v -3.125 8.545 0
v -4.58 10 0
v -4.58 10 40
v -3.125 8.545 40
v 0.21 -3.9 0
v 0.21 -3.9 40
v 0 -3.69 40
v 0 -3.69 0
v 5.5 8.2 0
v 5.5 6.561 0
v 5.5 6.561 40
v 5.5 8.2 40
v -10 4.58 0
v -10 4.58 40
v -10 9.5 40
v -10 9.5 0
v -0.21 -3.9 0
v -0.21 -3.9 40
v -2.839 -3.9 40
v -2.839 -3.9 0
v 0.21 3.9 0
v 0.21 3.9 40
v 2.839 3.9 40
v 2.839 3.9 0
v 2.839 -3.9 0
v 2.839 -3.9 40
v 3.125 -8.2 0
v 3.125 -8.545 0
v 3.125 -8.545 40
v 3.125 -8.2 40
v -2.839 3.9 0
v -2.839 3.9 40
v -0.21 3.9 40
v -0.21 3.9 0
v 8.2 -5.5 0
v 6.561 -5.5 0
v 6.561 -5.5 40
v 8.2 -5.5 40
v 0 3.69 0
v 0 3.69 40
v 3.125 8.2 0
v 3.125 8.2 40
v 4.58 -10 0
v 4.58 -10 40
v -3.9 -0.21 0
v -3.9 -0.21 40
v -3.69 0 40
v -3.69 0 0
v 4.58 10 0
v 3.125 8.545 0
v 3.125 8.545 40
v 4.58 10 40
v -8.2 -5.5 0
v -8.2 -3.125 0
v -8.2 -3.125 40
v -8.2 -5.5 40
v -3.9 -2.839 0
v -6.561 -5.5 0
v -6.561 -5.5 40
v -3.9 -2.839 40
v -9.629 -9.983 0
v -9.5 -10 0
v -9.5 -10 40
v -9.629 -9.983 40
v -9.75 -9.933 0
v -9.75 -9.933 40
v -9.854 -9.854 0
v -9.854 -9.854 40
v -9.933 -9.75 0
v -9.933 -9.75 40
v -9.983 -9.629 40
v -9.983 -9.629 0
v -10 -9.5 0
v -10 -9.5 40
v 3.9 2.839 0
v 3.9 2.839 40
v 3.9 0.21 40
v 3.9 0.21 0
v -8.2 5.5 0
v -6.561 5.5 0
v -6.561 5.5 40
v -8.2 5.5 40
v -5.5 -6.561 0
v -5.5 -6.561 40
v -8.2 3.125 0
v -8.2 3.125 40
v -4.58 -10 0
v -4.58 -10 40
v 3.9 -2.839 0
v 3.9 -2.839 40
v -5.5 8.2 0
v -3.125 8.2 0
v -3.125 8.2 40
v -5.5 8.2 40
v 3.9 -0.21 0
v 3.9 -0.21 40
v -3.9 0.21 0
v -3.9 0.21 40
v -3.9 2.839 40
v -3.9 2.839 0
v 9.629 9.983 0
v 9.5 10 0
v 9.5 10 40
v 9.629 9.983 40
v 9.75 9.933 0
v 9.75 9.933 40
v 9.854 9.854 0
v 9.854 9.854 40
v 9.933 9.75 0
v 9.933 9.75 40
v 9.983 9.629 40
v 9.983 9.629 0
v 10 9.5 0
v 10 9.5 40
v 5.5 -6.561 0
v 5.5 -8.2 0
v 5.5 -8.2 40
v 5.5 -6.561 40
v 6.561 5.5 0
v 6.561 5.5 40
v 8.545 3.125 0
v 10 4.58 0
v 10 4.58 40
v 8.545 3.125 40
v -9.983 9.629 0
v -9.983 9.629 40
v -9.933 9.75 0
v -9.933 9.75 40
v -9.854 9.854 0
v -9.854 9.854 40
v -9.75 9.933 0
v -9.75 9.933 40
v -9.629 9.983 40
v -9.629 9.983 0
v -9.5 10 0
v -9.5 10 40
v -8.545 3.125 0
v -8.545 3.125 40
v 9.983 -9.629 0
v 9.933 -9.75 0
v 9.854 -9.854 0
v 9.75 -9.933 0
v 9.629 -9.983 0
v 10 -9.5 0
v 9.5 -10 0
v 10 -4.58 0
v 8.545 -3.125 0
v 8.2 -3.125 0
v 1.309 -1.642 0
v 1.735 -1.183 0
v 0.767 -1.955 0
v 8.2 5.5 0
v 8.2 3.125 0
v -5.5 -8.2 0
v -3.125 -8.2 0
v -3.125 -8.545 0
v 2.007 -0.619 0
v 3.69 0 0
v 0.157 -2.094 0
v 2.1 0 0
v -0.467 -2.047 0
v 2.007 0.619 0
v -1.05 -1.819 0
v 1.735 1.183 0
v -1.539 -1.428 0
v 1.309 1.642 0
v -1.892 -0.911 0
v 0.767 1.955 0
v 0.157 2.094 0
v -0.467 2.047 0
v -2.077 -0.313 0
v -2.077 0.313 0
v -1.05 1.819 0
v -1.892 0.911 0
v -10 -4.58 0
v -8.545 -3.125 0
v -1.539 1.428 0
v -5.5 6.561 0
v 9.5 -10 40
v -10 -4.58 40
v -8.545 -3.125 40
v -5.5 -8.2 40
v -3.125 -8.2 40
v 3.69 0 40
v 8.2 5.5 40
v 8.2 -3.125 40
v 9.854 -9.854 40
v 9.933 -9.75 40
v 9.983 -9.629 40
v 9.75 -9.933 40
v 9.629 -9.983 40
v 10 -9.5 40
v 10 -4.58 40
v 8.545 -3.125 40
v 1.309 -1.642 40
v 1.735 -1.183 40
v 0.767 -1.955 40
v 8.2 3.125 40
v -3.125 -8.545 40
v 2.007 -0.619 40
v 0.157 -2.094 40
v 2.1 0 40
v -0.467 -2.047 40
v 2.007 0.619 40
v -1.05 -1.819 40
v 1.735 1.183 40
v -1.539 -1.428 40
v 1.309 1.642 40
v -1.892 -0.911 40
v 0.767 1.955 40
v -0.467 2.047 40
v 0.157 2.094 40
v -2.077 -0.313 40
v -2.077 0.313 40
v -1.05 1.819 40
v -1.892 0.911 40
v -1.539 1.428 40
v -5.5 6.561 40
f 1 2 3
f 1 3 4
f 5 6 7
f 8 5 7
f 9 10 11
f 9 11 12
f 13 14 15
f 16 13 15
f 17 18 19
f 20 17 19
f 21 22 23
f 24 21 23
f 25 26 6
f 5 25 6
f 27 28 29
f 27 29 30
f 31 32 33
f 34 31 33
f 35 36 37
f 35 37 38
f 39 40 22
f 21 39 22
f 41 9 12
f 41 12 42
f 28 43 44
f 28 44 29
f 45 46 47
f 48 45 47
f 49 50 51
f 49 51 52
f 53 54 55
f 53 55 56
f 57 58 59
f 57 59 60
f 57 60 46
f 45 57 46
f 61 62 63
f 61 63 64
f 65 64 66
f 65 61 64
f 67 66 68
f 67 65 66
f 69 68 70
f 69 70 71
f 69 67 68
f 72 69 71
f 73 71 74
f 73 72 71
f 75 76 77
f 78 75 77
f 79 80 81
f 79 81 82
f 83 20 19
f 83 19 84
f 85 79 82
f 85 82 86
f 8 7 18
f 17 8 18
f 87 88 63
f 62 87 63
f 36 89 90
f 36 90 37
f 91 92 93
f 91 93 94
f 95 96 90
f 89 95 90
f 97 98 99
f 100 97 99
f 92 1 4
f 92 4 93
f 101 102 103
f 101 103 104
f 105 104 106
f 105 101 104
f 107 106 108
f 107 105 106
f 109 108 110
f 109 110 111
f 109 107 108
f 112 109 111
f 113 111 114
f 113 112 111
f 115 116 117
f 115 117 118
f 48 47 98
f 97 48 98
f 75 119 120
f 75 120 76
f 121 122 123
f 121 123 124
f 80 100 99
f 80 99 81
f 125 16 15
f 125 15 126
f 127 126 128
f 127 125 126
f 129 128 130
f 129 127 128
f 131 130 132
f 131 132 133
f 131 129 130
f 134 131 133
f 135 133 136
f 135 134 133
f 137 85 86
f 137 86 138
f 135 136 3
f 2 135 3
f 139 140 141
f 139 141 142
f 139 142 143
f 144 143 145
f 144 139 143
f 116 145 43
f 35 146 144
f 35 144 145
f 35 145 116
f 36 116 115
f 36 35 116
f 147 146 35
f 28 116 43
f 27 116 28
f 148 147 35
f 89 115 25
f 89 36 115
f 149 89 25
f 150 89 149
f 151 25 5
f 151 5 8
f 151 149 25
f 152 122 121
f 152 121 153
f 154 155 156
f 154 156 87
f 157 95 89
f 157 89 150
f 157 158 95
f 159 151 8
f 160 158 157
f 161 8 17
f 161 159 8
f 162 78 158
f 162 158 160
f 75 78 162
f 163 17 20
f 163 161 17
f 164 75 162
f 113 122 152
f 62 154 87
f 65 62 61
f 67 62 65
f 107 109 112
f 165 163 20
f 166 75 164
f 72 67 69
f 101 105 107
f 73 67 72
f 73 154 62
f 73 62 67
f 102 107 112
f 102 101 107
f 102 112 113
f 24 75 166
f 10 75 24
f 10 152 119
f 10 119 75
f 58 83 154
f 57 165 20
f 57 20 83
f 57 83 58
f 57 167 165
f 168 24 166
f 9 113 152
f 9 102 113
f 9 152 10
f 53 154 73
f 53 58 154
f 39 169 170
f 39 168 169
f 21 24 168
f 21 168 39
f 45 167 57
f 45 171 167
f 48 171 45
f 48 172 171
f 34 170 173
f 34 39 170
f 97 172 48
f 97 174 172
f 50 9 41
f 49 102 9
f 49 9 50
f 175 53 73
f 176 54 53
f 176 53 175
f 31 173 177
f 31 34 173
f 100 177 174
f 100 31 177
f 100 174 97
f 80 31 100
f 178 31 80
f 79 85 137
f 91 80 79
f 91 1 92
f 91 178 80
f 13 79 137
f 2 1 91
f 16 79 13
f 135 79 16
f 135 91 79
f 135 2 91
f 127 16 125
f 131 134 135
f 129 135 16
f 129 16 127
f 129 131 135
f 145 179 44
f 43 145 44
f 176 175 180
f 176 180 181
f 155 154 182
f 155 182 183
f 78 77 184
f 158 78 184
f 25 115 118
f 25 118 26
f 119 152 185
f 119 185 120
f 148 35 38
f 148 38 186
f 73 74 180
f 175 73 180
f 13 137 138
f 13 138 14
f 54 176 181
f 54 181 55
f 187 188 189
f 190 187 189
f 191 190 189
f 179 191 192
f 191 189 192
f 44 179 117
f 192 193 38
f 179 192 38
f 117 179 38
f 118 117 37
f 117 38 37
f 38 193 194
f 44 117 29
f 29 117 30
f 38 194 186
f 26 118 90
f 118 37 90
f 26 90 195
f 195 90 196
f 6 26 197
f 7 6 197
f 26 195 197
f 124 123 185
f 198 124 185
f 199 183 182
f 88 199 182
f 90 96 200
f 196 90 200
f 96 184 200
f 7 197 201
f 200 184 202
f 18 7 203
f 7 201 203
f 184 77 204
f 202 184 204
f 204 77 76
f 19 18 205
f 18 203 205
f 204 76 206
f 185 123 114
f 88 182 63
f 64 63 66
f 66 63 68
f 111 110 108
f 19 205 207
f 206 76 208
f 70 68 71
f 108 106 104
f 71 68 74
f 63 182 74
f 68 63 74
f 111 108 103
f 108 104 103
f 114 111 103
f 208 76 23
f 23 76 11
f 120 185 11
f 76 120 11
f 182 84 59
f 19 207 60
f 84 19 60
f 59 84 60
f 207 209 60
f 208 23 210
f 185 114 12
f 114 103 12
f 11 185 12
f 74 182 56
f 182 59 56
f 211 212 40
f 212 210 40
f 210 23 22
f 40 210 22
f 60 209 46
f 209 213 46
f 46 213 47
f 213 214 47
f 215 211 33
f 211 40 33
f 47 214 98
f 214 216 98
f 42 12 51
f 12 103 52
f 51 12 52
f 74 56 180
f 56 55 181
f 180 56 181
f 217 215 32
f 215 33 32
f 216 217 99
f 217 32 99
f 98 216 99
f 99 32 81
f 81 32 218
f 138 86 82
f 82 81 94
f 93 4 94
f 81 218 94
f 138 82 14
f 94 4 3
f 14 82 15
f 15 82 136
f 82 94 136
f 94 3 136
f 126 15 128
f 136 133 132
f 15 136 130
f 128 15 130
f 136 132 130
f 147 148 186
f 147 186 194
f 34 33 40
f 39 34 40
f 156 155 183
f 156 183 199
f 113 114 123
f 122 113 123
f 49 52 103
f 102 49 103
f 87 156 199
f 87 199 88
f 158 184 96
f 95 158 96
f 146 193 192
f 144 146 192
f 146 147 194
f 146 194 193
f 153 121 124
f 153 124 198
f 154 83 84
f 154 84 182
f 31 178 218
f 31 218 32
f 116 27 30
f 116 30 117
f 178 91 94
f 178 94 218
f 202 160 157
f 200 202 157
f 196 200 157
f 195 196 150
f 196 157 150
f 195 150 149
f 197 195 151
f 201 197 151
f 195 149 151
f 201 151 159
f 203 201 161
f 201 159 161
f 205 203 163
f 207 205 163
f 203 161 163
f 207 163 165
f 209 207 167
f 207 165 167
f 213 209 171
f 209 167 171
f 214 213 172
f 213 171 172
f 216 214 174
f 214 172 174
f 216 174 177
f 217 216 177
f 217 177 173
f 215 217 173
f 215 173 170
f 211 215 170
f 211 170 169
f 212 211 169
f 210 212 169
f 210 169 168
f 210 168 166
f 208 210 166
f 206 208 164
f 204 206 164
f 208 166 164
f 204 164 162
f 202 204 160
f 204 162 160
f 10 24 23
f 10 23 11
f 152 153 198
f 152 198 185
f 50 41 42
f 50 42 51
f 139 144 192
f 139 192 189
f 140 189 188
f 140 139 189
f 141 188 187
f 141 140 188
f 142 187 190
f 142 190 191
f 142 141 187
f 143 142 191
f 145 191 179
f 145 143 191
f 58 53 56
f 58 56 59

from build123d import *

# Parameters (mm, degrees)
SKETCH1_R           = 2.1
BOSS_EXTRUDE1_DEPTH = 40


with BuildPart() as part:
    # Sketch1 → Boss-Extrude1 (new body)
    with BuildSketch(Plane(origin=(0, 0, 0), x_dir=(-1, 0, 0), z_dir=(0, 0, -1))):
        with BuildLine():
            Line((-3.9, -0.21), (-3.9, -2.839339828))
            Line((-3.9, -2.839339828), (-6.560660172, -5.5))
            Line((-6.560660172, -5.5), (-8.2, -5.5))
            Line((-8.2, -5.5), (-8.2, -3.125))
            Line((-8.2, -3.125), (-8.545, -3.125))
            Line((-8.545, -3.125), (-10, -4.58))
            Line((-10, -4.58), (-10, -9.5))
            ThreePointArc((-10, -9.5), (-9.853553391, -9.853553391), (-9.5, -10))
            Line((-9.5, -10), (-4.58, -10))
            Line((-4.58, -10), (-3.125, -8.545))
            Line((-3.125, -8.545), (-3.125, -8.2))
            Line((-3.125, -8.2), (-5.5, -8.2))
            Line((-5.5, -8.2), (-5.5, -6.560660172))
            Line((-5.5, -6.560660172), (-2.839339828, -3.9))
            Line((-2.839339828, -3.9), (-0.21, -3.9))
            Line((-0.21, -3.9), (0, -3.69))
            Line((0, -3.69), (0.21, -3.9))
            Line((0.21, -3.9), (2.839339828, -3.9))
            Line((2.839339828, -3.9), (5.5, -6.560660172))
            Line((5.5, -6.560660172), (5.5, -8.2))
            Line((5.5, -8.2), (3.125, -8.2))
            Line((3.125, -8.2), (3.125, -8.545))
            Line((3.125, -8.545), (4.58, -10))
            Line((4.58, -10), (9.5, -10))
            ThreePointArc((9.5, -10), (9.853553391, -9.853553391), (10, -9.5))
            Line((10, -9.5), (10, -4.58))
            Line((10, -4.58), (8.545, -3.125))
            Line((8.545, -3.125), (8.2, -3.125))
            Line((8.2, -3.125), (8.2, -5.5))
            Line((8.2, -5.5), (6.560660172, -5.5))
            Line((6.560660172, -5.5), (3.9, -2.839339828))
            Line((3.9, -2.839339828), (3.9, -0.21))
            Line((3.9, -0.21), (3.69, 0))
            Line((3.69, 0), (3.9, 0.21))
            Line((3.9, 0.21), (3.9, 2.839339828))
            Line((3.9, 2.839339828), (6.560660172, 5.5))
            Line((6.560660172, 5.5), (8.2, 5.5))
            Line((8.2, 5.5), (8.2, 3.125))
            Line((8.2, 3.125), (8.545, 3.125))
            Line((8.545, 3.125), (10, 4.58))
            Line((10, 4.58), (10, 9.5))
            ThreePointArc((10, 9.5), (9.853553391, 9.853553391), (9.5, 10))
            Line((9.5, 10), (4.58, 10))
            Line((4.58, 10), (3.125, 8.545))
            Line((3.125, 8.545), (3.125, 8.2))
            Line((3.125, 8.2), (5.5, 8.2))
            Line((5.5, 8.2), (5.5, 6.560660172))
            Line((5.5, 6.560660172), (2.839339828, 3.9))
            Line((2.839339828, 3.9), (0.21, 3.9))
            Line((0.21, 3.9), (0, 3.69))
            Line((0, 3.69), (-0.21, 3.9))
            Line((-0.21, 3.9), (-2.839339828, 3.9))
            Line((-2.839339828, 3.9), (-5.5, 6.560660172))
            Line((-5.5, 6.560660172), (-5.5, 8.2))
            Line((-5.5, 8.2), (-3.125, 8.2))
            Line((-3.125, 8.2), (-3.125, 8.545))
            Line((-3.125, 8.545), (-4.58, 10))
            Line((-4.58, 10), (-9.5, 10))
            ThreePointArc((-9.5, 10), (-9.853553391, 9.853553391), (-10, 9.5))
            Line((-10, 9.5), (-10, 4.58))
            Line((-10, 4.58), (-8.545, 3.125))
            Line((-8.545, 3.125), (-8.2, 3.125))
            Line((-8.2, 3.125), (-8.2, 5.5))
            Line((-8.2, 5.5), (-6.560660172, 5.5))
            Line((-6.560660172, 5.5), (-3.9, 2.839339828))
            Line((-3.9, 2.839339828), (-3.9, 0.21))
            Line((-3.9, 0.21), (-3.69, 0))
            Line((-3.69, 0), (-3.9, -0.21))
        make_face()
        with Locations(Location((0, 0, 0), (0, 0, 180))):
            Circle(SKETCH1_R, mode=Mode.SUBTRACT)
    extrude(amount=-BOSS_EXTRUDE1_DEPTH)


solid = part.part
